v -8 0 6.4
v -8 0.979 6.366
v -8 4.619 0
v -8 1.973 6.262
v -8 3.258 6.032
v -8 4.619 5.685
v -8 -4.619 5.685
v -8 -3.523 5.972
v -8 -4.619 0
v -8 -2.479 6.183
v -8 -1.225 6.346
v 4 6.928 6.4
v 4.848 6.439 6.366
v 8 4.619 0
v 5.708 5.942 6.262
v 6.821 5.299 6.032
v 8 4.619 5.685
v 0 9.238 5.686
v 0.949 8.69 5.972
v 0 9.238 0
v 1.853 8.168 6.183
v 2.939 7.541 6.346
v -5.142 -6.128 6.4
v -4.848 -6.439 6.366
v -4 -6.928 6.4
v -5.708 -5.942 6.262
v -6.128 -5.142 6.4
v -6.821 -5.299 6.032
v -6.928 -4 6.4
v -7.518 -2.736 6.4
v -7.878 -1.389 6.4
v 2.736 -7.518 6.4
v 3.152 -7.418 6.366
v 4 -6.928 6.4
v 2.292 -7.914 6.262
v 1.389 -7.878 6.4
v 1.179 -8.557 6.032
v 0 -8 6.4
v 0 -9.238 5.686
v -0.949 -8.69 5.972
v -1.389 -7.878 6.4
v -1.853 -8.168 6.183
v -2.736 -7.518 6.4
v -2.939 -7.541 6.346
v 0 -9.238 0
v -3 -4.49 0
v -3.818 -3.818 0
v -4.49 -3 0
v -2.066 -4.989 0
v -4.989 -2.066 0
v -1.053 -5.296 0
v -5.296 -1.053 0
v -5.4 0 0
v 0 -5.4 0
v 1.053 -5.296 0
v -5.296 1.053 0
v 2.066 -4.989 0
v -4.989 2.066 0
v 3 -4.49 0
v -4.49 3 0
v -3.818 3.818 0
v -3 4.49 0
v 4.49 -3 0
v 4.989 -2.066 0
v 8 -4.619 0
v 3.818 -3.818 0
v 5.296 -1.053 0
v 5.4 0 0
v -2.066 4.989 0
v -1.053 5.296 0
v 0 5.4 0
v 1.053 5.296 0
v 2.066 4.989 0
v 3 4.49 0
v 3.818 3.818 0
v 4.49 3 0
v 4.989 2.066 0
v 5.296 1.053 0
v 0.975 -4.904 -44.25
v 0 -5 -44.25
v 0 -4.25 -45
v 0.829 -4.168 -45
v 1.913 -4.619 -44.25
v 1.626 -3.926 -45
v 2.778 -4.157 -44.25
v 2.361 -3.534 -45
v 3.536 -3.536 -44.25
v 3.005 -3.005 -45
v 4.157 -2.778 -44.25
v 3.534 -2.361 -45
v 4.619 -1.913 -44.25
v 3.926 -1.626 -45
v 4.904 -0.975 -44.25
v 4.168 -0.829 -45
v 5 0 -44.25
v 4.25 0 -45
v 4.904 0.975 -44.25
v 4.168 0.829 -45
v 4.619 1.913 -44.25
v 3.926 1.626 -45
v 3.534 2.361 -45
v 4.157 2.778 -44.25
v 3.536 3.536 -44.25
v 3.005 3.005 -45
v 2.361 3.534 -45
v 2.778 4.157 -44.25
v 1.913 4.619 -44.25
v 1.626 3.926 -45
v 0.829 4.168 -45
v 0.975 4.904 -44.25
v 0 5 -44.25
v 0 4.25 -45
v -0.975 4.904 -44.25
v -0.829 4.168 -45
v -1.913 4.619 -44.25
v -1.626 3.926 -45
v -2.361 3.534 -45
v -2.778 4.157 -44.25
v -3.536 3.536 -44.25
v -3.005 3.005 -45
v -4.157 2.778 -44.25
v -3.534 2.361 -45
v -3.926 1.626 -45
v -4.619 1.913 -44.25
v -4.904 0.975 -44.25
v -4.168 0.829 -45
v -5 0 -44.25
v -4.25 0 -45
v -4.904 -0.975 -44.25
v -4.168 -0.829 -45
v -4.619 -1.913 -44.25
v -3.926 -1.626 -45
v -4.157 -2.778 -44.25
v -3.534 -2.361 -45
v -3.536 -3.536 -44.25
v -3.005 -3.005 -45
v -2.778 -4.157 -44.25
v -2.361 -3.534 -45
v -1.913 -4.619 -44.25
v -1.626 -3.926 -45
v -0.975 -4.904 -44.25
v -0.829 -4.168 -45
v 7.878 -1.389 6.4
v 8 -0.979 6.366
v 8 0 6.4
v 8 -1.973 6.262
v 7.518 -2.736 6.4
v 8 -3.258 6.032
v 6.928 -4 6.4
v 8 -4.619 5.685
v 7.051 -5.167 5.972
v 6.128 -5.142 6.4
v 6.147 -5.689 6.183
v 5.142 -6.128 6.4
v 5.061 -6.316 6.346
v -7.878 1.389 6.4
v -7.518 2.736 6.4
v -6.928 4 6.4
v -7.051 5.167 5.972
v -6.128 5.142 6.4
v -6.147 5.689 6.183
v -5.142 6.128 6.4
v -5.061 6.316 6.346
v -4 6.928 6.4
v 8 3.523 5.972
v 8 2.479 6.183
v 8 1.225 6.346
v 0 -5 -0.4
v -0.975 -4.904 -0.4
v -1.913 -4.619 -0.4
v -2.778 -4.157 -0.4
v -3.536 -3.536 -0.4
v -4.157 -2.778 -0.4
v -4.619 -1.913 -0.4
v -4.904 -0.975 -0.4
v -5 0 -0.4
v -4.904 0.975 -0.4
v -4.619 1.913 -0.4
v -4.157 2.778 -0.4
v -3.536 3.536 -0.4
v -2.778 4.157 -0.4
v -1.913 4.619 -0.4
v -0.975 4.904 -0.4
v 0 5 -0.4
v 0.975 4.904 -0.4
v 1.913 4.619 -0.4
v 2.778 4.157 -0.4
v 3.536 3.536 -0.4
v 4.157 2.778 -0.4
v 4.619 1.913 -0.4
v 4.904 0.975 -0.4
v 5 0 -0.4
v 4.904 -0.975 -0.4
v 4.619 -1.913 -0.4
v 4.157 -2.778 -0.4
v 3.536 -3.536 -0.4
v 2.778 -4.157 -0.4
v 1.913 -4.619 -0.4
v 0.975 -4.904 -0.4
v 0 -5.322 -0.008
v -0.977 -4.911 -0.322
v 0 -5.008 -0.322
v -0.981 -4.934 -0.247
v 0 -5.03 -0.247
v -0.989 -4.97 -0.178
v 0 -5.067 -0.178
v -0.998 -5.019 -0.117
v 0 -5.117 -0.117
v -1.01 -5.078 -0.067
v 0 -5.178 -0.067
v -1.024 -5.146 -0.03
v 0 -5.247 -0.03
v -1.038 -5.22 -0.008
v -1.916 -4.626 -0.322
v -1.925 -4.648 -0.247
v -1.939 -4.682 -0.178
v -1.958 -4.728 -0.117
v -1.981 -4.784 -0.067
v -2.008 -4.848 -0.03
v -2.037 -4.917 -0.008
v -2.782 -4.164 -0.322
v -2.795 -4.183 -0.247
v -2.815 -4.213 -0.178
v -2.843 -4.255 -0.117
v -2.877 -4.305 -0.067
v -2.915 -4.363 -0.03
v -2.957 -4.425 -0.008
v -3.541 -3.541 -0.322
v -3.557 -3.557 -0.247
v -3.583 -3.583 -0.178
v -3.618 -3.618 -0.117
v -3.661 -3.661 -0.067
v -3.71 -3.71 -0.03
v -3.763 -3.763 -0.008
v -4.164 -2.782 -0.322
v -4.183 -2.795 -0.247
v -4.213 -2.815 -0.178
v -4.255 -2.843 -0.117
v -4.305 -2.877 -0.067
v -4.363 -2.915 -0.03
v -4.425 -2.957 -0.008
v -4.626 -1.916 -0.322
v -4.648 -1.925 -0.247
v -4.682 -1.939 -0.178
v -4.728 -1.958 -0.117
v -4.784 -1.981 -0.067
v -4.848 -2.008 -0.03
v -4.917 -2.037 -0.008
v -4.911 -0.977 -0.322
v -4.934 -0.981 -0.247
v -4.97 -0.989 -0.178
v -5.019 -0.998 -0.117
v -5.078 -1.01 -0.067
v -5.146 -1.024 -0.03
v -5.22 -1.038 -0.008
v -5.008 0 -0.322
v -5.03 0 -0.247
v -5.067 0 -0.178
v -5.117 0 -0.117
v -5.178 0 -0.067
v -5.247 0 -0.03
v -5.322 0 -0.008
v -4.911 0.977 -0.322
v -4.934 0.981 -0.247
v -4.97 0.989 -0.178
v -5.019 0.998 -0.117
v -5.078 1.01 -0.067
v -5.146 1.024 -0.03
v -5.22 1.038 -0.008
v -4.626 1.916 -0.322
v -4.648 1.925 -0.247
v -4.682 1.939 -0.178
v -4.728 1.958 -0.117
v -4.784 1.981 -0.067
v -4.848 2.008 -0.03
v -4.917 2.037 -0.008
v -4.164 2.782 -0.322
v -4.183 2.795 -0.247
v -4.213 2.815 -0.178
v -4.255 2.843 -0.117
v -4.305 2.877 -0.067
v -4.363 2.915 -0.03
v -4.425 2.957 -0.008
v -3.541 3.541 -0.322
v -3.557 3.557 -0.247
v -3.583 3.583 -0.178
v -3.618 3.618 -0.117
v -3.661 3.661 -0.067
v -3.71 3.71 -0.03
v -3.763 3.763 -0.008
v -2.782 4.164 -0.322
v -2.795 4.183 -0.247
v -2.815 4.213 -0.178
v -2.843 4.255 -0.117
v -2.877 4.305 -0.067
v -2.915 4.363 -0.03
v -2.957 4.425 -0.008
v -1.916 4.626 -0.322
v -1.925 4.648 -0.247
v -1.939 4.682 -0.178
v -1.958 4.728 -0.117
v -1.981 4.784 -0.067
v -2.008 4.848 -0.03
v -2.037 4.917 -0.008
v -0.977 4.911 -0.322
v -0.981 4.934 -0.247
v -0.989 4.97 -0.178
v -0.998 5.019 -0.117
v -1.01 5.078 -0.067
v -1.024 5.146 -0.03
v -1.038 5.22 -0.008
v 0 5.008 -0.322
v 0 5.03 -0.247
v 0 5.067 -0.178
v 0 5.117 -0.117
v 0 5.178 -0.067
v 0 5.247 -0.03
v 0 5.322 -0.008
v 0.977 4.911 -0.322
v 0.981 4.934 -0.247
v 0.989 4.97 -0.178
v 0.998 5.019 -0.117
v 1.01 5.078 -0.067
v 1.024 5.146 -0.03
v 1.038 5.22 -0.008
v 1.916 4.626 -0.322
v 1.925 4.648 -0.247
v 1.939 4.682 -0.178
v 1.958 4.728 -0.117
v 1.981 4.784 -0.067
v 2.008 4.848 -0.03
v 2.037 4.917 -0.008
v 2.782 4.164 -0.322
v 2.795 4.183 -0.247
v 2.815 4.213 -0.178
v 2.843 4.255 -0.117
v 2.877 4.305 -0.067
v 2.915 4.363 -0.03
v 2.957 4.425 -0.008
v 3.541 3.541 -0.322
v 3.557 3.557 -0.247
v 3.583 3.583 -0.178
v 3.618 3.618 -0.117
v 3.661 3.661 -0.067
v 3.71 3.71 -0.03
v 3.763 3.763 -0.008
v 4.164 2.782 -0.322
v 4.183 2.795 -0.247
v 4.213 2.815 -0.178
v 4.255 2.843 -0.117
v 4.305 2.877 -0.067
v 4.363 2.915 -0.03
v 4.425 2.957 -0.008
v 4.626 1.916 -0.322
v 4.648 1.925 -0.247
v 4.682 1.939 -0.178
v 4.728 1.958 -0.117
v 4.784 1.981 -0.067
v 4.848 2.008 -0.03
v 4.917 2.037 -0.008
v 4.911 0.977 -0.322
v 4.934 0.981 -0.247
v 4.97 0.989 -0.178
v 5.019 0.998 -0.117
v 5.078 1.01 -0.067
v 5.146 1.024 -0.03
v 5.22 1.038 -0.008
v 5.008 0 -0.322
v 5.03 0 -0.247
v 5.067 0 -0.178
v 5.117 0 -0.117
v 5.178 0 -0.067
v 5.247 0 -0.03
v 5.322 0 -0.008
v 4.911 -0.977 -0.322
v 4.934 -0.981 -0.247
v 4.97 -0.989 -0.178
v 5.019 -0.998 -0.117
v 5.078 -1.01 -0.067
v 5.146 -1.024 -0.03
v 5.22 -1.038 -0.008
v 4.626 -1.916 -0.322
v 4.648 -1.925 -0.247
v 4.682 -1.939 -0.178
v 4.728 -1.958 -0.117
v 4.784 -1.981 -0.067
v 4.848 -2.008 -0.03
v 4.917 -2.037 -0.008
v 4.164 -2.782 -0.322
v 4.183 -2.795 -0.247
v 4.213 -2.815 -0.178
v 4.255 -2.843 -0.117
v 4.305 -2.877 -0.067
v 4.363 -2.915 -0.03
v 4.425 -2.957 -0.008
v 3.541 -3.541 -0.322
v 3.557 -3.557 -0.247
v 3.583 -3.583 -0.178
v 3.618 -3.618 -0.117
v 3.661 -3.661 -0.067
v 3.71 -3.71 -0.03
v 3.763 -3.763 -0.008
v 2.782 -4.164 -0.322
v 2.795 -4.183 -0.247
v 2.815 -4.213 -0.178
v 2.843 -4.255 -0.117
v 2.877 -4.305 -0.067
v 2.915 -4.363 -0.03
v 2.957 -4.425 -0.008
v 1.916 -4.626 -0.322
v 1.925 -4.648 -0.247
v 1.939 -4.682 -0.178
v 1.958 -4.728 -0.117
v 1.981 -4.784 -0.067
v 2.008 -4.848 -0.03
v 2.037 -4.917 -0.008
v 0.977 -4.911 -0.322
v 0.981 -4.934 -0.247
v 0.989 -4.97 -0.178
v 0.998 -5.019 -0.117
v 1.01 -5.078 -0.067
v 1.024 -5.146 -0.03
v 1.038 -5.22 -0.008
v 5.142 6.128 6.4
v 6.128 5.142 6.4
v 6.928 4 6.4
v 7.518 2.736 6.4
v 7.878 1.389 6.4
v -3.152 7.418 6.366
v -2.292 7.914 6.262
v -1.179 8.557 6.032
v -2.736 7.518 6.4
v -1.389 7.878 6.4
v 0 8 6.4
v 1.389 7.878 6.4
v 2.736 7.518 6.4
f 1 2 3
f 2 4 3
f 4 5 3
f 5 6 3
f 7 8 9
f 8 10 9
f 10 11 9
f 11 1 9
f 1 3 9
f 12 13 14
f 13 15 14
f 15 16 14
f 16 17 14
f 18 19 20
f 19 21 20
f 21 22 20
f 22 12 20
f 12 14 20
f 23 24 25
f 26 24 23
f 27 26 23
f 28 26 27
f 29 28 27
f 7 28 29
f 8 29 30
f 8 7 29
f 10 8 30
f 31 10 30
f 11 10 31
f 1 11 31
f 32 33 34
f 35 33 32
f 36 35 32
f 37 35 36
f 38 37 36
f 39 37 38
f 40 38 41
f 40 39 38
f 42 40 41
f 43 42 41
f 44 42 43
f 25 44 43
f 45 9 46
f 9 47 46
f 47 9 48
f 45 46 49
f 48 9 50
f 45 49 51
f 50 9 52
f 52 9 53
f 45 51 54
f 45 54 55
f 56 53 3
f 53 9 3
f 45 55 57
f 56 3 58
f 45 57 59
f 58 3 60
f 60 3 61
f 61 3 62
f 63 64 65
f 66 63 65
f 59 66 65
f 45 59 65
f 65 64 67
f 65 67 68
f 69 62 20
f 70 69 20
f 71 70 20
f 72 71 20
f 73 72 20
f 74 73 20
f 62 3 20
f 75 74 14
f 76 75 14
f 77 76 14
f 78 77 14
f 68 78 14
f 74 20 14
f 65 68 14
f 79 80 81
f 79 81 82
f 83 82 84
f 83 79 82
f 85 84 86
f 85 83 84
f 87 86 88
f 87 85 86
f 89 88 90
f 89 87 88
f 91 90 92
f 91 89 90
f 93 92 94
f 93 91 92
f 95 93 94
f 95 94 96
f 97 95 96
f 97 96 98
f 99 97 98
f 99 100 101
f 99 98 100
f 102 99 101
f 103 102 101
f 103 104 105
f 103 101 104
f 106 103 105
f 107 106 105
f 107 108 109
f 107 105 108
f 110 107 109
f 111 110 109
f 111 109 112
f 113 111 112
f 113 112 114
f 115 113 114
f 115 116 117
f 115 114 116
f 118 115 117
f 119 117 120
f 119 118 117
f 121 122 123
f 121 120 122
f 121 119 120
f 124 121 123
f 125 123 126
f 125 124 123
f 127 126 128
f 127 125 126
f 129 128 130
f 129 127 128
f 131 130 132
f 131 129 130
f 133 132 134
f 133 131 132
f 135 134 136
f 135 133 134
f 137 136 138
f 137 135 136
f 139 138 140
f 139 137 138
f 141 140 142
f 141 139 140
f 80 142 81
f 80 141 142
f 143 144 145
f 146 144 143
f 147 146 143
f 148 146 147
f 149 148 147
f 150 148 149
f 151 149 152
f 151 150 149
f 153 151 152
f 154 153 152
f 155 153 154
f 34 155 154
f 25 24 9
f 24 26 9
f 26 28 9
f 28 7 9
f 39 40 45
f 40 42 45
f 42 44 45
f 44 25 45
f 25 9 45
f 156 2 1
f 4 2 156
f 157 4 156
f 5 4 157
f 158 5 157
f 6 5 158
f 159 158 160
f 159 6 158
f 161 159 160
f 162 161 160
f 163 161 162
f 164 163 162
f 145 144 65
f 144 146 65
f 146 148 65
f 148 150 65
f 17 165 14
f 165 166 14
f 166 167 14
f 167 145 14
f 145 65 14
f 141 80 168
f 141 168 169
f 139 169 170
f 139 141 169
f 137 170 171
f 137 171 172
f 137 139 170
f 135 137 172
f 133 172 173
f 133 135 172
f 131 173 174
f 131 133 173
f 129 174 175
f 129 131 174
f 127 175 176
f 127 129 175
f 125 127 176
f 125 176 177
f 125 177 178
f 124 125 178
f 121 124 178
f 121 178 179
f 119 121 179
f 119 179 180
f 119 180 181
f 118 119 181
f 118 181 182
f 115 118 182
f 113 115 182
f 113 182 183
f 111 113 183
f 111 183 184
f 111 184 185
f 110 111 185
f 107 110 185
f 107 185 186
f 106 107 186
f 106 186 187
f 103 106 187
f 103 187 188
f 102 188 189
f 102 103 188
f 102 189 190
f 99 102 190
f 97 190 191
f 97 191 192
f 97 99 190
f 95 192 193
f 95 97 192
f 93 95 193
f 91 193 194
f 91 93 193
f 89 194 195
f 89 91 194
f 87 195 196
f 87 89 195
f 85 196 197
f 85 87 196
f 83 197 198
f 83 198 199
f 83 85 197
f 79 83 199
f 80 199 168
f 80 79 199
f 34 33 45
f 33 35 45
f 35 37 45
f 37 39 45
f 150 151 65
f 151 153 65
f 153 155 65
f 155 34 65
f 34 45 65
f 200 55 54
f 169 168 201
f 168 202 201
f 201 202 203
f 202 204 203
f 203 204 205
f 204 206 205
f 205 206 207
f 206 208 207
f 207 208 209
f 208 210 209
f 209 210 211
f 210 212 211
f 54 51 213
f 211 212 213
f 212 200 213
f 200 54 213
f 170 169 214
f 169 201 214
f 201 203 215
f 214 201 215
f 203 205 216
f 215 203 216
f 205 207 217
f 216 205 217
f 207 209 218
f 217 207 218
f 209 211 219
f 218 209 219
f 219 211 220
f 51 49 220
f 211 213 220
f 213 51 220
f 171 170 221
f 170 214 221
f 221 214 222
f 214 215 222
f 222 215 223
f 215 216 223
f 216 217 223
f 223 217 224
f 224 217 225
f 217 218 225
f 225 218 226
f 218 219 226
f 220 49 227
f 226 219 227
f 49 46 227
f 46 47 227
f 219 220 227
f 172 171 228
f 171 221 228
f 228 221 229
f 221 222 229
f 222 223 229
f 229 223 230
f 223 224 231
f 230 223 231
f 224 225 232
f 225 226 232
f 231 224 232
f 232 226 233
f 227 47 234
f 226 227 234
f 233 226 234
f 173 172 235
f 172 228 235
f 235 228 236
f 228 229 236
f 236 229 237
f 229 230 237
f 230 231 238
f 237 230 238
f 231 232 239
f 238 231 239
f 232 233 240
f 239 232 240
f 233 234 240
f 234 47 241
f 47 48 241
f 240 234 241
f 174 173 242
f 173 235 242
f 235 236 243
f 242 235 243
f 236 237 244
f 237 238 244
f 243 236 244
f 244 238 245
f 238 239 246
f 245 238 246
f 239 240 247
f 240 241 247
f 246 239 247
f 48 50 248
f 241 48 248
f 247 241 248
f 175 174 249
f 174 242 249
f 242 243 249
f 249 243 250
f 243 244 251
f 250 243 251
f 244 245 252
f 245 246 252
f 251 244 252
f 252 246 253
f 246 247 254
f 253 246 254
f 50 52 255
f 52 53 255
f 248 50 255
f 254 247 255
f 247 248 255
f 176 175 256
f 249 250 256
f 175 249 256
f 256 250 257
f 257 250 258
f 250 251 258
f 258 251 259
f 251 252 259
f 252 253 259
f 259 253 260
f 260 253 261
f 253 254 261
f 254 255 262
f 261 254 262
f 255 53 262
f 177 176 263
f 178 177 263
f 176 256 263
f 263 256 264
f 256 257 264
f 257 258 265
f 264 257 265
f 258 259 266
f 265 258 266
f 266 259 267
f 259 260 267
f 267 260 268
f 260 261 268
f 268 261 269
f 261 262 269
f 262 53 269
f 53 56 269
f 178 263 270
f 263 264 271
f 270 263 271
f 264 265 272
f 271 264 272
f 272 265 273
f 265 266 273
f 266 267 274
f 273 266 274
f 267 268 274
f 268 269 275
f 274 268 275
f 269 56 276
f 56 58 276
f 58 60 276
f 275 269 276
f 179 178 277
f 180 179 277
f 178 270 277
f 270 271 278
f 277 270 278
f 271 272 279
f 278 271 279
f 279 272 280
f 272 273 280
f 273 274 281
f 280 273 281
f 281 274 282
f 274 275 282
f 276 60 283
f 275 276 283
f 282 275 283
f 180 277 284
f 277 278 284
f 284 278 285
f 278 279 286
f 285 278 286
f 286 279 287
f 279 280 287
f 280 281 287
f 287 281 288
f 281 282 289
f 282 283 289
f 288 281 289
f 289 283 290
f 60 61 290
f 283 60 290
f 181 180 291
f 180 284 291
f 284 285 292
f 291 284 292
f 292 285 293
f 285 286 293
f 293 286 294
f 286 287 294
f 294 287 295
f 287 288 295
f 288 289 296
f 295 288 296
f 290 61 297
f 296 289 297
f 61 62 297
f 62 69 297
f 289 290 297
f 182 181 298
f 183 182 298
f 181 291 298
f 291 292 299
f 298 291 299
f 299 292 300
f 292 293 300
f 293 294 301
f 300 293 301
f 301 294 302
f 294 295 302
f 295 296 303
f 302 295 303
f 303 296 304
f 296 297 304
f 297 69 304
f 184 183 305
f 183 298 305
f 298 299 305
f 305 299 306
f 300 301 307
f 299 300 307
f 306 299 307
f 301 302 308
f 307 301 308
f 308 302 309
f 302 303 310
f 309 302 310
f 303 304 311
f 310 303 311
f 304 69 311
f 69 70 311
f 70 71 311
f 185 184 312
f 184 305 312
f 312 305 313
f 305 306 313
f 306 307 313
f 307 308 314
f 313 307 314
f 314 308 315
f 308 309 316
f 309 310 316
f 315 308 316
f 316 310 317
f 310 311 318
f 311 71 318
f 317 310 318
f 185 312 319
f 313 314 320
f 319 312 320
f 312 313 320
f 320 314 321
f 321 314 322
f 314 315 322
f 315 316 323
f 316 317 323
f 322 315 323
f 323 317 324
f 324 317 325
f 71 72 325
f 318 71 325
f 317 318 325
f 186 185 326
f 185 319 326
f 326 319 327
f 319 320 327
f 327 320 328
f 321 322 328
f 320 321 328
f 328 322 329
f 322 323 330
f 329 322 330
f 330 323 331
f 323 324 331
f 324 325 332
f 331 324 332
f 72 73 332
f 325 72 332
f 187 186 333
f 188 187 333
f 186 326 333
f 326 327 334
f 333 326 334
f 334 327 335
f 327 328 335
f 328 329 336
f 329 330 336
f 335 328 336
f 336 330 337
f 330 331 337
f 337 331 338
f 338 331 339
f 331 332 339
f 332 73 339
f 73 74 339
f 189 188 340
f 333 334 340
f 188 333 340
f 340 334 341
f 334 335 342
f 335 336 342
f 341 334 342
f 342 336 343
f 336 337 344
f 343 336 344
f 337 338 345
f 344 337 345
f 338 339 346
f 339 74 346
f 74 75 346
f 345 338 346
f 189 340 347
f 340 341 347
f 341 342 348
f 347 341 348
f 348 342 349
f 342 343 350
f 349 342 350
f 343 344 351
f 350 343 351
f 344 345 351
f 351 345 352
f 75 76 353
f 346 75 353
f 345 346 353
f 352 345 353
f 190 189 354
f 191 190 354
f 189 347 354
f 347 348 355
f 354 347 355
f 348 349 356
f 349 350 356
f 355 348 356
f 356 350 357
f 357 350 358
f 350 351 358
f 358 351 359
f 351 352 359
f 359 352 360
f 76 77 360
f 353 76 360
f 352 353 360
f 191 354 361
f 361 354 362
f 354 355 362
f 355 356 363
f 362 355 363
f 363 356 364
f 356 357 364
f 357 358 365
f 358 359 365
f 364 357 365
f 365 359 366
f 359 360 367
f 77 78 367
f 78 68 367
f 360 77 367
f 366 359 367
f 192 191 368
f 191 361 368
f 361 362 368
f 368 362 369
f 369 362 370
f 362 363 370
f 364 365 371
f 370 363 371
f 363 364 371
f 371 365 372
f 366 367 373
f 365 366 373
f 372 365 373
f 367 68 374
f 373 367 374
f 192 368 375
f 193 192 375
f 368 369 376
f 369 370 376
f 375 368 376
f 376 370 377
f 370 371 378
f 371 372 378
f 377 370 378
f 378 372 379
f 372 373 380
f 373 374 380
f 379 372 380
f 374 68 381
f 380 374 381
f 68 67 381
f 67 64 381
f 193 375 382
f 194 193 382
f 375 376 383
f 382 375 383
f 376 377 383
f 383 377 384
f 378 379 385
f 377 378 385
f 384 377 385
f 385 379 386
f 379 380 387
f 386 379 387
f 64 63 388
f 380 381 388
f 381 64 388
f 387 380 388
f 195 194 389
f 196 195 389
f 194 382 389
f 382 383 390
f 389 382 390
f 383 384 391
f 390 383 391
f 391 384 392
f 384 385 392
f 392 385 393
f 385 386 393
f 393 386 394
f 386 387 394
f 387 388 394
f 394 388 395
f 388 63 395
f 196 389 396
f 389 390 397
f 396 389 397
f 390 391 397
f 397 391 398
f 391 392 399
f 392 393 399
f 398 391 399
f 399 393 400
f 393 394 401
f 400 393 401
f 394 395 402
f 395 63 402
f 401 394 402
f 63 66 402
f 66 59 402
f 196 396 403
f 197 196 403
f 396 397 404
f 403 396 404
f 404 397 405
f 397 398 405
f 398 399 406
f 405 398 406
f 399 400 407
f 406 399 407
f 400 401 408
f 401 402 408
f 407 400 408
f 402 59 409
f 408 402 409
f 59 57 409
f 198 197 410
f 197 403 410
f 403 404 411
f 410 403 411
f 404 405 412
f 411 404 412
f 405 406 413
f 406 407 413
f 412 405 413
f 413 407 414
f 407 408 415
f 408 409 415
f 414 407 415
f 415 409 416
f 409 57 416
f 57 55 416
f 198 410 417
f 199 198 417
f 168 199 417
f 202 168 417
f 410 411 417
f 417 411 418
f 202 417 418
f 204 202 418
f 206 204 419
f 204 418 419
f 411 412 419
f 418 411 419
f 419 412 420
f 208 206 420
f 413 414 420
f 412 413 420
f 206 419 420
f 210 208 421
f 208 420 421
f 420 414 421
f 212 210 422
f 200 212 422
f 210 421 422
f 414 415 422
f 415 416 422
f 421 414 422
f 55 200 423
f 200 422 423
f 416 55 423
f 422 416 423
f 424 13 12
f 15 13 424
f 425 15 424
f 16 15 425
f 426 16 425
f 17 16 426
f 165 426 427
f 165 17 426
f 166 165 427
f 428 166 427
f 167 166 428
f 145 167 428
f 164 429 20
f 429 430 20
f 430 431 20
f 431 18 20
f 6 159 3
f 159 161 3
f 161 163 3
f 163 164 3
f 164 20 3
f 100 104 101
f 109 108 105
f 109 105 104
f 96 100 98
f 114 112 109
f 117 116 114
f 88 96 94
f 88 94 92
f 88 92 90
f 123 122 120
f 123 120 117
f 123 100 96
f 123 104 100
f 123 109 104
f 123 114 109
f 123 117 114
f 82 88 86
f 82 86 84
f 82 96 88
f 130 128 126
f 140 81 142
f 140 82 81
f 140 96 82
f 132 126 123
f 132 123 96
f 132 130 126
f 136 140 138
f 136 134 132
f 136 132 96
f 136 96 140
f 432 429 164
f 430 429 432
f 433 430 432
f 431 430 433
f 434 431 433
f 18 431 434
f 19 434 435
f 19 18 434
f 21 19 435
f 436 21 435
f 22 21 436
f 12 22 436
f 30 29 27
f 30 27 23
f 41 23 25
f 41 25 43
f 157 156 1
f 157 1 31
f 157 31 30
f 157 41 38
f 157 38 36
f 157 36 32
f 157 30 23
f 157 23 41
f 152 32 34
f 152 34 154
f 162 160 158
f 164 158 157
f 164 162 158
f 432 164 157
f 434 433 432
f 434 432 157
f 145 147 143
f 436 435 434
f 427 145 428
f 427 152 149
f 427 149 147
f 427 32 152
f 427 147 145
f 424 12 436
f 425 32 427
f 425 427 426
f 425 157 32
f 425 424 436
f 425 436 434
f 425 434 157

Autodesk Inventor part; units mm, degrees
ref_plane "WorkPlane1" through (0, 0, 0) normal (0, 0, 1) x (1, 0, 0)
sketch "Sketch1" plane through (0, 0, 0) normal (0, 0, 1) x (1, 0, 0)
  point P0 (0, 0)
sketch "Sketch2" plane through (0, 0, 0) normal (0, 0, 1) x (1, 0, 0)
  line L0 (-8, 4.6189) -> (-8, -4.6189)
  line L1 (0, 9.2375) -> (-8, 4.6189)
  line L2 (8, 4.6189) -> (0, 9.2375)
  line L3 (8, -4.6189) -> (8, 4.6189)
  line L4 (0, -9.2375) -> (8, -4.6189)
  line L5 (-8, -4.6189) -> (0, -9.2375)
  circle A0 centre (0, 0) radius 8 construction
  dimension "d1" = 16
  dimension "d29" = 0
  dimension "d30" = 0
extrude "Extrusion1" add sketch "Sketch2" along normal blind 6.4
sketch "Sketch3" plane through (0, 0, 0) normal (1, 0, 0) x (0, 1, 0)
  line L0 (8, 6.4) -> (9.3375, 6.4)
  line L1 (9.3375, 5.6278) -> (8, 6.4)
  line L2 (9.3375, 6.4) -> (9.3375, 5.6278)
  line L3 (0, -1.28) -> (0, 7.68) projected
  line L4 (9.2375, 0) -> (9.2375, 6.4) projected
  dimension "d25" = 0.1
  dimension "d26" = 0
  dimension "d27" = 60
  dimension "d28" = 8
revolve "Revolution1" cut sketch "Sketch3" angle 360 about axis through (0, 0, -10) along (0, 0, 1)
sketch "Sketch4" plane through (0, 0, 0) normal (1, 0, 0) x (0, 1, 0)
  line L0 (0, -45) -> (0, 0)
  line L1 (-5, -45) -> (0, -45)
  line L2 (-5, 0) -> (-5, -45)
  line L3 (0, 0) -> (-5, 0)
  line L4 (0, -45) -> (0, 0)
  line L5 (-6, 0) -> (1, 0) projected
  line L6 (0, -54) -> (0, 9) projected
  dimension "d18" = 5
  dimension "d20" = 45
  dimension "d33" = 0
  dimension "d34" = 0
revolve "Revolution2" add sketch "Sketch4" angle 360 about axis through (0, 0, -45) along (0, 0, -1)
chamfer "Chamfer1" distance 0.75 angle 45 1 edges at (0, 5, -45)
fillet "Fillet1" radius 0.4 1 edges at (0, 5, 0)
thread "Thread1" size "M10x1.5" class "6g" standard "ISO Metric profile" length 26
ref_plane "MSC_PF1" through (0, 0, 0) normal (1, 0, 0) x (0, 1, 0)
ref_plane "MSC_PT1" through (0, 0, 0) normal (0, 0, -1) x (-1, 0, 0)
equation "\"d22\" = 0.5 * PTC"
equation "\"d23\" = 0.5 * PTC"
equation "\"d24\" = r"
equation "\"d1\" = ParS"
equation "\"d6\" = ParK"
equation "\"d28\" = 0.5 * ParS"
equation "\"d18\" = 0.5 * NND"
equation "\"d20\" = NLG"
equation "\"NLG\" = 45"
equation "\"PTC\" = 1.5"
equation "\"ParK\" = 6.4"
equation "\"ParS\" = 16"
equation "\"msp_es\" = 0.577367 * ParS"
equation "\"r\" = 0.4"
equation "\"NND\" = 10"
properties part number "ISO 4016 - M10 x 45" material "Steel"
